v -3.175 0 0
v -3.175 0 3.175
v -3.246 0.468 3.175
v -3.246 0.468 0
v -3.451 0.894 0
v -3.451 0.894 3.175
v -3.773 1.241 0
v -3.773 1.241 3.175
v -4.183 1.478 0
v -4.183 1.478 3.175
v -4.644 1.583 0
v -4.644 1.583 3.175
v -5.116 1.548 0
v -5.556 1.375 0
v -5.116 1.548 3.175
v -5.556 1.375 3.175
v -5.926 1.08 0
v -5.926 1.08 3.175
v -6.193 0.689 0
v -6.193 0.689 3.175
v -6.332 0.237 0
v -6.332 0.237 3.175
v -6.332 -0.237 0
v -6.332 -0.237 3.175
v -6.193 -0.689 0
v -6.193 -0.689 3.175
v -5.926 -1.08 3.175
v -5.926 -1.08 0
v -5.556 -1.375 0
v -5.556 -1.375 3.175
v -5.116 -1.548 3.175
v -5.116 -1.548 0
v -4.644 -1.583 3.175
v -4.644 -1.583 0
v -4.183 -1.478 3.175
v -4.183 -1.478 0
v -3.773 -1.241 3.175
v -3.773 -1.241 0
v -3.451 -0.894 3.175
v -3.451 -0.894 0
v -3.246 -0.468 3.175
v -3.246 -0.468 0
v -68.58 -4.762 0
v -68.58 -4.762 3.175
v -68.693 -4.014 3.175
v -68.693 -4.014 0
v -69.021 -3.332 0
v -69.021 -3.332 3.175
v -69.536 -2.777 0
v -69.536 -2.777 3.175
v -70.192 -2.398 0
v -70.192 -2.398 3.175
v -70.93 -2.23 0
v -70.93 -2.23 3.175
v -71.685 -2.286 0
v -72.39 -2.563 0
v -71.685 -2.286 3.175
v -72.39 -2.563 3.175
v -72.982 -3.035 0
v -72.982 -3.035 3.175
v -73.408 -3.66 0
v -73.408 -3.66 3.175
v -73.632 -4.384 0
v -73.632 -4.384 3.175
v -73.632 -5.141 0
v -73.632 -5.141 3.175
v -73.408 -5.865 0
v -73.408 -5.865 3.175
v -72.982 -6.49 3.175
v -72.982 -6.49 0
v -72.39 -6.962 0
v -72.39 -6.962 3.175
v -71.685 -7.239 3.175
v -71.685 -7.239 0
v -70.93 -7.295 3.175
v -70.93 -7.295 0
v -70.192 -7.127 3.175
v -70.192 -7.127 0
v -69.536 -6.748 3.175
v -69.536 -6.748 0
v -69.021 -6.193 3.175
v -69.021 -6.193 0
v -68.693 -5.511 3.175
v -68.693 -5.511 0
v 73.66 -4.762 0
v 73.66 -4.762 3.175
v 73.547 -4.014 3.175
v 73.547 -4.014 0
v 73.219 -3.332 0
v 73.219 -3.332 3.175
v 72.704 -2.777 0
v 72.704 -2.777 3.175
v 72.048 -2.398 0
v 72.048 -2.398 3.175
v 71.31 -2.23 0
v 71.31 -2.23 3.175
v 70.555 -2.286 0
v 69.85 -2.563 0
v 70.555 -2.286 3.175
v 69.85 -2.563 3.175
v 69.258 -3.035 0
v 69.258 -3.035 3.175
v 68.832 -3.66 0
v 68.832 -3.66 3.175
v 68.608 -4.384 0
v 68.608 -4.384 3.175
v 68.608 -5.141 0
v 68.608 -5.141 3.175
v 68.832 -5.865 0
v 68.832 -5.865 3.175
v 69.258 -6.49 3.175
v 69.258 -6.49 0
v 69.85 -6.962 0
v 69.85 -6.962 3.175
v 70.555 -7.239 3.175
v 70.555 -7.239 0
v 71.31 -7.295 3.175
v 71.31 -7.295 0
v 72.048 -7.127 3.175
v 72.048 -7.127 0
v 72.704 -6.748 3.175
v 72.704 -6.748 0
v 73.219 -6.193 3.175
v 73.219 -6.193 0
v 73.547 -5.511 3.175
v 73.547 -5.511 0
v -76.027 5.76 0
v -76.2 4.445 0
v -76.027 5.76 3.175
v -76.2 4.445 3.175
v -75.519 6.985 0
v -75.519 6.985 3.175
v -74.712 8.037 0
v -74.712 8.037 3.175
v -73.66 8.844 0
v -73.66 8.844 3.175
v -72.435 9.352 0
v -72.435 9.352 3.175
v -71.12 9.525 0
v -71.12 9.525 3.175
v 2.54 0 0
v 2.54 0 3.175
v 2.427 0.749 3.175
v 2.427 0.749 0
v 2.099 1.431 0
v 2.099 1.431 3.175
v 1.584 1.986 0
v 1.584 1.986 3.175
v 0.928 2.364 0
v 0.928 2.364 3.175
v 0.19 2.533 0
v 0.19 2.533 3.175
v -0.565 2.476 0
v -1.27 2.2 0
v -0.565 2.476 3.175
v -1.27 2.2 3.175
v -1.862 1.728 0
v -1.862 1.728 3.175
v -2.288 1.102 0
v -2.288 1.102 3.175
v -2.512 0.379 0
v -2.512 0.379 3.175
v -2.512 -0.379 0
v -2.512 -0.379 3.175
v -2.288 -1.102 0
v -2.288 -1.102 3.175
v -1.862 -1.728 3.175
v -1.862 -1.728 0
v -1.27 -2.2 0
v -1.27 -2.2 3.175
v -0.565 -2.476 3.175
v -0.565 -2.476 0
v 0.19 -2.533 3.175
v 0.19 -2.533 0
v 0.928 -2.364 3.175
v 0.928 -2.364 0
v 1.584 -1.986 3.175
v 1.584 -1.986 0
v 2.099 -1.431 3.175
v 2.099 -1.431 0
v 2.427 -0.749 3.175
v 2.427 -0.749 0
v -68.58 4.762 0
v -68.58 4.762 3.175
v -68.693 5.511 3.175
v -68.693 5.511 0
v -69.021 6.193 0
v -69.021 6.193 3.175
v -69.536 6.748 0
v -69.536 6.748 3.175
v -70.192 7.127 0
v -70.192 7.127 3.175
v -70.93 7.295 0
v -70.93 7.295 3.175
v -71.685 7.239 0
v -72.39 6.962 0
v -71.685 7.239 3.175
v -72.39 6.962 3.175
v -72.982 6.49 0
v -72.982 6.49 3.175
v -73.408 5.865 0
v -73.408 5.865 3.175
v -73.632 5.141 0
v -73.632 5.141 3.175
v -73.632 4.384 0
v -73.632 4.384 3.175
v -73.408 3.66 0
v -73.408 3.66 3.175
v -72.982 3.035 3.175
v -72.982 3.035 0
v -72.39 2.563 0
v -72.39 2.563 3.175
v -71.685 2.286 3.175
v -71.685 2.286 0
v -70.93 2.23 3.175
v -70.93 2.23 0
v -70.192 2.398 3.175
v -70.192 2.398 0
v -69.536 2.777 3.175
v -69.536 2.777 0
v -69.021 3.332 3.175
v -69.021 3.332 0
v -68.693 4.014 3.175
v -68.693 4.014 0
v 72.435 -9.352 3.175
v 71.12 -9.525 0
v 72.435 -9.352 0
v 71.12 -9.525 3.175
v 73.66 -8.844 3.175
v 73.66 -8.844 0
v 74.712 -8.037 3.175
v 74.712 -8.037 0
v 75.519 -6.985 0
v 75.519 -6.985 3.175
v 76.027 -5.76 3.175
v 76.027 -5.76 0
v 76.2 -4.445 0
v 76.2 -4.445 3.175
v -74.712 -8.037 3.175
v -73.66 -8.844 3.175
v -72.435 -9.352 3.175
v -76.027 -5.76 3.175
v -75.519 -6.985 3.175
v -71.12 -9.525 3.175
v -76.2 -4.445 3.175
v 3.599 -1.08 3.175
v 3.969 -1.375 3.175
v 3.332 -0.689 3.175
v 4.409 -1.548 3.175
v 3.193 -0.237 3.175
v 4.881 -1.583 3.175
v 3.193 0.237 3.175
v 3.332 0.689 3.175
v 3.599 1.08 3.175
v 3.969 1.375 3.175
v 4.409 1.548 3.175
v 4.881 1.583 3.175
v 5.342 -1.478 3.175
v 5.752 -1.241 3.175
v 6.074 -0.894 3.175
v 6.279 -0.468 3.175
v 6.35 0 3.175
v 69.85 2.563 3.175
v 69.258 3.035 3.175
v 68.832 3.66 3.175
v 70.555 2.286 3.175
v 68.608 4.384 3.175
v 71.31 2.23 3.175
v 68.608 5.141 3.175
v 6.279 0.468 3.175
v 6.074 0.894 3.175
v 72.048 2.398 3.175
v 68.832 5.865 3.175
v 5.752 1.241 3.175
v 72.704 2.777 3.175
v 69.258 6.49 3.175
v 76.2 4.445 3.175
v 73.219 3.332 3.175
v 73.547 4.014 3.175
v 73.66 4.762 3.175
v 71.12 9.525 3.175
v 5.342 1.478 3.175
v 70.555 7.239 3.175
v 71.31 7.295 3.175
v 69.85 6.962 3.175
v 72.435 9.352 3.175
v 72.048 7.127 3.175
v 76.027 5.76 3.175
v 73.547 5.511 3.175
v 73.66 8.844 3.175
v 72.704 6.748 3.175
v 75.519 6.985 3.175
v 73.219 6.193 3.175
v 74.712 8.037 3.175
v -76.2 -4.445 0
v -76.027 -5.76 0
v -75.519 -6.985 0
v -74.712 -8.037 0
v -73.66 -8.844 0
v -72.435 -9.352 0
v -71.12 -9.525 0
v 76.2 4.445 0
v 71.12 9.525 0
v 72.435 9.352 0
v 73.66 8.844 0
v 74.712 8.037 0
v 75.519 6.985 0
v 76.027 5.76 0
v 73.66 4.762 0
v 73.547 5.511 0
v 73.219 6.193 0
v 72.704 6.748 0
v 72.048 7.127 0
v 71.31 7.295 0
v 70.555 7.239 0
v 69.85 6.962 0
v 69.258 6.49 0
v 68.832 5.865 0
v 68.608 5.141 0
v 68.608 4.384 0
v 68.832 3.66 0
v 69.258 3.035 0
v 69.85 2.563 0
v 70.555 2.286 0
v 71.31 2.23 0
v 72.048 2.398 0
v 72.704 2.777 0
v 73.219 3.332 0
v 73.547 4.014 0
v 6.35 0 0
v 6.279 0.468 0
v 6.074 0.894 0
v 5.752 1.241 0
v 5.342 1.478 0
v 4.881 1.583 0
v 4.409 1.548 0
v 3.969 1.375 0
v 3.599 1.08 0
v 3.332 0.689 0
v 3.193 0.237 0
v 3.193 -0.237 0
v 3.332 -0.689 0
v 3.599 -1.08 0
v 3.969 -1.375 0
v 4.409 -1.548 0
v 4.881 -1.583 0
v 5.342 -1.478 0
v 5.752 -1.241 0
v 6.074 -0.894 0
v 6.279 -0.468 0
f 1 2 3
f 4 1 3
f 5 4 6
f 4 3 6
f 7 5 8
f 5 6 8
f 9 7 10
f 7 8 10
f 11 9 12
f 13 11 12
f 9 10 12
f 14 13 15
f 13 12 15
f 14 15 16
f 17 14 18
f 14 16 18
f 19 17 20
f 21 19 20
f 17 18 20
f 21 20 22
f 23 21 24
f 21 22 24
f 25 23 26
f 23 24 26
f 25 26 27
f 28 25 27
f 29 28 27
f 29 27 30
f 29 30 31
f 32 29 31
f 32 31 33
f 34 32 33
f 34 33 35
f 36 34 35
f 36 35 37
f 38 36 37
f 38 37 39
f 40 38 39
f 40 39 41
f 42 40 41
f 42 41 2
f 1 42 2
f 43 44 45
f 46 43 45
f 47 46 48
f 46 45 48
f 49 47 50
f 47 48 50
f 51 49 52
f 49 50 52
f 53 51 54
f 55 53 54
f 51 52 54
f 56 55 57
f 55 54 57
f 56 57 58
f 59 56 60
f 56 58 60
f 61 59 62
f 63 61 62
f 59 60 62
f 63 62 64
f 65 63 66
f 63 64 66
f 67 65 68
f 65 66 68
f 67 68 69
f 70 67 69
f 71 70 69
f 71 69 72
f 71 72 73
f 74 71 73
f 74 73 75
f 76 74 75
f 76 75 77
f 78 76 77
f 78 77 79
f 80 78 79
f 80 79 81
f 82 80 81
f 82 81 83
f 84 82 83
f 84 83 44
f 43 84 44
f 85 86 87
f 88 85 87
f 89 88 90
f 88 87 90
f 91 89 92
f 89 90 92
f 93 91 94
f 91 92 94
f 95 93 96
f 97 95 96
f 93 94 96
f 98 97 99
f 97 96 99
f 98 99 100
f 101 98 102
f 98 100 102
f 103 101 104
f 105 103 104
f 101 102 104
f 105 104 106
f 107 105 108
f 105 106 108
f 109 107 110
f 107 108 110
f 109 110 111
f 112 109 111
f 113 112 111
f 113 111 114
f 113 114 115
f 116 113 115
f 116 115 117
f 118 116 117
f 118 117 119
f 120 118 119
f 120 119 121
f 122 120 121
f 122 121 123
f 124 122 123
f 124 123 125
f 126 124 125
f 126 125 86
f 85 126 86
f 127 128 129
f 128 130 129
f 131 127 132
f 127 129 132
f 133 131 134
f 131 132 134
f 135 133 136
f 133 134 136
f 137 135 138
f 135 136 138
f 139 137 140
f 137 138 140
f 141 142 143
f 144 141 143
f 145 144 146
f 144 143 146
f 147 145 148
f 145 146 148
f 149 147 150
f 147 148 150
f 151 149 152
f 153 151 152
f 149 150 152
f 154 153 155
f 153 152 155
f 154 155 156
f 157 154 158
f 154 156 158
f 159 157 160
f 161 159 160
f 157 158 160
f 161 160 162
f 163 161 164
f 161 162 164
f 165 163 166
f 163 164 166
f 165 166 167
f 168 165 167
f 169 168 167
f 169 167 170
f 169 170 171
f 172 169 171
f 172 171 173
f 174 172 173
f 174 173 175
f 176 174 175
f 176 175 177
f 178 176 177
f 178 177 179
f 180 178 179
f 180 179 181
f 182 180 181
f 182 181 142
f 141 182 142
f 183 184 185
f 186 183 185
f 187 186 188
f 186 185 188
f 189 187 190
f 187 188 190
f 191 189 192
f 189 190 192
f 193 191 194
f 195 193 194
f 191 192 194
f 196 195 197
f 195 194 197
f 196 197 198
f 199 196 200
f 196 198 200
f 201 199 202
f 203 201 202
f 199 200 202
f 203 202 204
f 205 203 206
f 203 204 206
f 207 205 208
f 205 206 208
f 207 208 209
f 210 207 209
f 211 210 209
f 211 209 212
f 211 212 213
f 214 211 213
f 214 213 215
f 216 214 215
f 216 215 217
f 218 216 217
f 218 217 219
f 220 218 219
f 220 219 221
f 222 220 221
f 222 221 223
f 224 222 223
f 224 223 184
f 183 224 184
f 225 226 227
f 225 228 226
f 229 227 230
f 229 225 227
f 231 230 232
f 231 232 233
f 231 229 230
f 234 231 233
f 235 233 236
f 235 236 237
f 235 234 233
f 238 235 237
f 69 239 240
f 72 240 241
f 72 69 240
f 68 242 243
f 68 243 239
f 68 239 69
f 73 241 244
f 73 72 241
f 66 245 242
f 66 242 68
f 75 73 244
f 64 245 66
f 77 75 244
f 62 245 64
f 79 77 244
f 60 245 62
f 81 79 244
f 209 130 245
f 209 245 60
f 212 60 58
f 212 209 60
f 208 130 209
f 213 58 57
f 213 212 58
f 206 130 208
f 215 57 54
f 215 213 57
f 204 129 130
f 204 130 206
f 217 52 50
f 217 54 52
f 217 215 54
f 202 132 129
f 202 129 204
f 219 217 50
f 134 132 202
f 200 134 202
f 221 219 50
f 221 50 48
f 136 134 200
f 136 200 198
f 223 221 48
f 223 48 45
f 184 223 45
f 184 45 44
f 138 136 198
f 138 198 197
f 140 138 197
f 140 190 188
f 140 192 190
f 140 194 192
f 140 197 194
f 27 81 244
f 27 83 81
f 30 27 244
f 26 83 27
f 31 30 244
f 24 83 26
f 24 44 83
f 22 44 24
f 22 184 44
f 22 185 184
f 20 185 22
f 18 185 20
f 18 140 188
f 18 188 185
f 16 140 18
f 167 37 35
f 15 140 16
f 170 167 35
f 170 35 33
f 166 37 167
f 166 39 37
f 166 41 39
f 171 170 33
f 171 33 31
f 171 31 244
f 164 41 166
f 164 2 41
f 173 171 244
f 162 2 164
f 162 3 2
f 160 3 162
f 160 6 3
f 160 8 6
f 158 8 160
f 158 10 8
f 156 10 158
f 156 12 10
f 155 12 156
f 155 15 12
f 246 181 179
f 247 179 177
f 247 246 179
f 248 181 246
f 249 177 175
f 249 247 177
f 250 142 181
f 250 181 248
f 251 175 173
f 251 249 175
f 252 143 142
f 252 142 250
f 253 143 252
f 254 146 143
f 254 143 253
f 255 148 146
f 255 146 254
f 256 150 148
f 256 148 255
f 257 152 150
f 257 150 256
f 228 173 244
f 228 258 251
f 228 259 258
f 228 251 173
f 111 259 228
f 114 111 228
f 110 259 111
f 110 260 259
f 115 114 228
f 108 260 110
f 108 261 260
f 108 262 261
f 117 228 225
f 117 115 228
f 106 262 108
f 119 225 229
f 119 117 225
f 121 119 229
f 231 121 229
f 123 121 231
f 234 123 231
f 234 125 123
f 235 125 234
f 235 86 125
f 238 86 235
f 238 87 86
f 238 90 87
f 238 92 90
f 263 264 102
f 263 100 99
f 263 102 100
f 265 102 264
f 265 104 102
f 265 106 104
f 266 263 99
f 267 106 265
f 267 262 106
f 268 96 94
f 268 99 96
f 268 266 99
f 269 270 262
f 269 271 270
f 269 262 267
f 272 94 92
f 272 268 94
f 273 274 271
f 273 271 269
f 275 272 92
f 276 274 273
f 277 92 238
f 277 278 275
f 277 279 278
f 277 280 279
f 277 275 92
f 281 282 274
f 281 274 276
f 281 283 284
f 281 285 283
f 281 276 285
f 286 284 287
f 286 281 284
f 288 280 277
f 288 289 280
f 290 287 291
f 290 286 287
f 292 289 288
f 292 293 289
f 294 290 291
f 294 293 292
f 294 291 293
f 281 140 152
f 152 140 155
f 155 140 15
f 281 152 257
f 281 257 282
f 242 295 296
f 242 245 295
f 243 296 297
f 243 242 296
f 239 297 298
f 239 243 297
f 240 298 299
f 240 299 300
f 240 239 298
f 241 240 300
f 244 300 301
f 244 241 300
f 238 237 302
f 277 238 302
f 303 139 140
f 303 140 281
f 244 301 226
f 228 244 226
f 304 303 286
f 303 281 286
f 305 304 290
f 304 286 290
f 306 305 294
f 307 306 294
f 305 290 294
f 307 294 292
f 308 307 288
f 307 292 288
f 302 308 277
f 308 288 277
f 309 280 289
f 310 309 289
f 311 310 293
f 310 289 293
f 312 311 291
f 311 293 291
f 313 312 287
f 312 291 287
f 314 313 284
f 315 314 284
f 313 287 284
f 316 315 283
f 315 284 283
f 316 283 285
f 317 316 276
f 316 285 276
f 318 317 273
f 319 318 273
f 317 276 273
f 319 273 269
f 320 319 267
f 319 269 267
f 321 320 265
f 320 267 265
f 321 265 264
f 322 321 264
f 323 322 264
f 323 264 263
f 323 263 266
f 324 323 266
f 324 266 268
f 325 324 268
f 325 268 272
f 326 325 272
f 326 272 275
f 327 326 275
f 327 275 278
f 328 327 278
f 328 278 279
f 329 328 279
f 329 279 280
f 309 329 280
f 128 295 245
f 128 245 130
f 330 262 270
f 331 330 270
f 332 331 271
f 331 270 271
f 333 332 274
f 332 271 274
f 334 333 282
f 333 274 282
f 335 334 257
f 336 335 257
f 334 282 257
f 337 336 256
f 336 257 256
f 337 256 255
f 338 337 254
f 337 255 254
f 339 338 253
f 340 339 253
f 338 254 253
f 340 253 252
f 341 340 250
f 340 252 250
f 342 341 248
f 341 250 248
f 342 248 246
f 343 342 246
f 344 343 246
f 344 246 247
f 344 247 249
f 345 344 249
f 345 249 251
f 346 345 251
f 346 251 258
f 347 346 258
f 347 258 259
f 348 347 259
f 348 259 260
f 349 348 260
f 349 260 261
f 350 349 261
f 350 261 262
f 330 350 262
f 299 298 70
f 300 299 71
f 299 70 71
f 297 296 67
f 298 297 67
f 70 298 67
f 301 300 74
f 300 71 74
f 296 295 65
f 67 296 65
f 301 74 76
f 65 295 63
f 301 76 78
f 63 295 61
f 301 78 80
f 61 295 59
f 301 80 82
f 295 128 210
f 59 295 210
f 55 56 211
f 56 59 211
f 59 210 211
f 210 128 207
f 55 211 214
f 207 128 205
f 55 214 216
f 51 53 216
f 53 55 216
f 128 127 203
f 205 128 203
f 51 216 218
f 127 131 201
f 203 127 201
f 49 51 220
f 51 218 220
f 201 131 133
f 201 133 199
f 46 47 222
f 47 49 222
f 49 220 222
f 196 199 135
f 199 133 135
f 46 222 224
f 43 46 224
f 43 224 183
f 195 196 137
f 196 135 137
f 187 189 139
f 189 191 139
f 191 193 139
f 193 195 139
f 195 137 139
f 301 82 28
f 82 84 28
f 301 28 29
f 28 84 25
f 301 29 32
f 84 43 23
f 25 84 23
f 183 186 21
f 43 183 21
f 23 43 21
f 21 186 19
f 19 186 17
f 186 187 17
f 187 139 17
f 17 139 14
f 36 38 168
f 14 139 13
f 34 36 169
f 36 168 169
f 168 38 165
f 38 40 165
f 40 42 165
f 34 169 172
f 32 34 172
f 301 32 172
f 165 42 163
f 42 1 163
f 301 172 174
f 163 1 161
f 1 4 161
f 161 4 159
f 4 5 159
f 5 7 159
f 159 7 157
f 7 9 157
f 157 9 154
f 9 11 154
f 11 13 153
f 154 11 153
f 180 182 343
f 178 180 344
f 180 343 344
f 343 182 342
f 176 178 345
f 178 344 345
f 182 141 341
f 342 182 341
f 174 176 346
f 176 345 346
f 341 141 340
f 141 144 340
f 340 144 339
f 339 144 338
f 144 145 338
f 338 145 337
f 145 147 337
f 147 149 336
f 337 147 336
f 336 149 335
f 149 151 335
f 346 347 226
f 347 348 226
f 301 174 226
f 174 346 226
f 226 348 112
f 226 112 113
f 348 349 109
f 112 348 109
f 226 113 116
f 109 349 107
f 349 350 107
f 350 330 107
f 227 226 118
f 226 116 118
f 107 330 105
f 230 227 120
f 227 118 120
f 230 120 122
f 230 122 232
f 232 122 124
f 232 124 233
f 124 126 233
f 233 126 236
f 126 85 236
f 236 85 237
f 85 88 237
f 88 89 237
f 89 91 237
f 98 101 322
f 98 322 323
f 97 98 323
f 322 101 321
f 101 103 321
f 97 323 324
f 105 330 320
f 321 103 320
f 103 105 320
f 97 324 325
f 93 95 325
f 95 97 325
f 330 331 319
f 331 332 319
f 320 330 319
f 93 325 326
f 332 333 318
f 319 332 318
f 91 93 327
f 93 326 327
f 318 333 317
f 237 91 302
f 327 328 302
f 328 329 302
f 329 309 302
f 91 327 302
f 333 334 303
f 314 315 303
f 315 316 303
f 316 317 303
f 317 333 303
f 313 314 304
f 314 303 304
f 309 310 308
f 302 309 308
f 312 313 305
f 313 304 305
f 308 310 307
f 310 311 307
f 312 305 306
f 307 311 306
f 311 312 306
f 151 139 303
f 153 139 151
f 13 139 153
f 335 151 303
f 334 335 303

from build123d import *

# Parameters (mm, degrees)
F0_W     = 152.4
F0_H     = 19.05
F1_DEPTH = 3.175
F2_R     = 2.54
F3_DEPTH = 3.176
F4_R     = 5.08
F5_R     = 2.54
F5_R_2   = 1.5875
F6_DEPTH = 3.176


with BuildPart() as f1:
    # F0 (on Top) → F1 (new body)
    with BuildSketch(Plane.XY):
        Rectangle(F0_W, F0_H)
    extrude(amount=F1_DEPTH)

    # F2 (on face) → F3 (cut, through all)
    with BuildSketch(Plane.XY.offset(3.175)):
        with Locations((-71.12, 4.7625)):
            Circle(F2_R)
        with Locations((-71.12, -4.7625)):
            Circle(F2_R)
        with Locations((71.12, 4.7625)):
            Circle(F2_R)
        with Locations((71.12, -4.7625)):
            Circle(F2_R)
    extrude(amount=-F3_DEPTH, mode=Mode.SUBTRACT)

    # F4
    f4_edges = [f1.edges().sort_by_distance(p)[0] for p in [
        (-76.2, 9.525, 1.5875),
        (-76.2, -9.525, 1.5875),
        (76.2, 9.525, 1.5875),
        (76.2, -9.525, 1.5875),
    ]]
    fillet(f4_edges, radius=F4_R)

    # F5 (on face) → F6 (cut, through all)
    with BuildSketch(Plane.XY.offset(3.175)):
        Circle(F5_R)
        with Locations((-4.7625, 0)):
            Circle(F5_R_2)
        with Locations((4.7625, 0)):
            Circle(F5_R_2)
    extrude(amount=-F6_DEPTH, mode=Mode.SUBTRACT)


solid = f1.part
